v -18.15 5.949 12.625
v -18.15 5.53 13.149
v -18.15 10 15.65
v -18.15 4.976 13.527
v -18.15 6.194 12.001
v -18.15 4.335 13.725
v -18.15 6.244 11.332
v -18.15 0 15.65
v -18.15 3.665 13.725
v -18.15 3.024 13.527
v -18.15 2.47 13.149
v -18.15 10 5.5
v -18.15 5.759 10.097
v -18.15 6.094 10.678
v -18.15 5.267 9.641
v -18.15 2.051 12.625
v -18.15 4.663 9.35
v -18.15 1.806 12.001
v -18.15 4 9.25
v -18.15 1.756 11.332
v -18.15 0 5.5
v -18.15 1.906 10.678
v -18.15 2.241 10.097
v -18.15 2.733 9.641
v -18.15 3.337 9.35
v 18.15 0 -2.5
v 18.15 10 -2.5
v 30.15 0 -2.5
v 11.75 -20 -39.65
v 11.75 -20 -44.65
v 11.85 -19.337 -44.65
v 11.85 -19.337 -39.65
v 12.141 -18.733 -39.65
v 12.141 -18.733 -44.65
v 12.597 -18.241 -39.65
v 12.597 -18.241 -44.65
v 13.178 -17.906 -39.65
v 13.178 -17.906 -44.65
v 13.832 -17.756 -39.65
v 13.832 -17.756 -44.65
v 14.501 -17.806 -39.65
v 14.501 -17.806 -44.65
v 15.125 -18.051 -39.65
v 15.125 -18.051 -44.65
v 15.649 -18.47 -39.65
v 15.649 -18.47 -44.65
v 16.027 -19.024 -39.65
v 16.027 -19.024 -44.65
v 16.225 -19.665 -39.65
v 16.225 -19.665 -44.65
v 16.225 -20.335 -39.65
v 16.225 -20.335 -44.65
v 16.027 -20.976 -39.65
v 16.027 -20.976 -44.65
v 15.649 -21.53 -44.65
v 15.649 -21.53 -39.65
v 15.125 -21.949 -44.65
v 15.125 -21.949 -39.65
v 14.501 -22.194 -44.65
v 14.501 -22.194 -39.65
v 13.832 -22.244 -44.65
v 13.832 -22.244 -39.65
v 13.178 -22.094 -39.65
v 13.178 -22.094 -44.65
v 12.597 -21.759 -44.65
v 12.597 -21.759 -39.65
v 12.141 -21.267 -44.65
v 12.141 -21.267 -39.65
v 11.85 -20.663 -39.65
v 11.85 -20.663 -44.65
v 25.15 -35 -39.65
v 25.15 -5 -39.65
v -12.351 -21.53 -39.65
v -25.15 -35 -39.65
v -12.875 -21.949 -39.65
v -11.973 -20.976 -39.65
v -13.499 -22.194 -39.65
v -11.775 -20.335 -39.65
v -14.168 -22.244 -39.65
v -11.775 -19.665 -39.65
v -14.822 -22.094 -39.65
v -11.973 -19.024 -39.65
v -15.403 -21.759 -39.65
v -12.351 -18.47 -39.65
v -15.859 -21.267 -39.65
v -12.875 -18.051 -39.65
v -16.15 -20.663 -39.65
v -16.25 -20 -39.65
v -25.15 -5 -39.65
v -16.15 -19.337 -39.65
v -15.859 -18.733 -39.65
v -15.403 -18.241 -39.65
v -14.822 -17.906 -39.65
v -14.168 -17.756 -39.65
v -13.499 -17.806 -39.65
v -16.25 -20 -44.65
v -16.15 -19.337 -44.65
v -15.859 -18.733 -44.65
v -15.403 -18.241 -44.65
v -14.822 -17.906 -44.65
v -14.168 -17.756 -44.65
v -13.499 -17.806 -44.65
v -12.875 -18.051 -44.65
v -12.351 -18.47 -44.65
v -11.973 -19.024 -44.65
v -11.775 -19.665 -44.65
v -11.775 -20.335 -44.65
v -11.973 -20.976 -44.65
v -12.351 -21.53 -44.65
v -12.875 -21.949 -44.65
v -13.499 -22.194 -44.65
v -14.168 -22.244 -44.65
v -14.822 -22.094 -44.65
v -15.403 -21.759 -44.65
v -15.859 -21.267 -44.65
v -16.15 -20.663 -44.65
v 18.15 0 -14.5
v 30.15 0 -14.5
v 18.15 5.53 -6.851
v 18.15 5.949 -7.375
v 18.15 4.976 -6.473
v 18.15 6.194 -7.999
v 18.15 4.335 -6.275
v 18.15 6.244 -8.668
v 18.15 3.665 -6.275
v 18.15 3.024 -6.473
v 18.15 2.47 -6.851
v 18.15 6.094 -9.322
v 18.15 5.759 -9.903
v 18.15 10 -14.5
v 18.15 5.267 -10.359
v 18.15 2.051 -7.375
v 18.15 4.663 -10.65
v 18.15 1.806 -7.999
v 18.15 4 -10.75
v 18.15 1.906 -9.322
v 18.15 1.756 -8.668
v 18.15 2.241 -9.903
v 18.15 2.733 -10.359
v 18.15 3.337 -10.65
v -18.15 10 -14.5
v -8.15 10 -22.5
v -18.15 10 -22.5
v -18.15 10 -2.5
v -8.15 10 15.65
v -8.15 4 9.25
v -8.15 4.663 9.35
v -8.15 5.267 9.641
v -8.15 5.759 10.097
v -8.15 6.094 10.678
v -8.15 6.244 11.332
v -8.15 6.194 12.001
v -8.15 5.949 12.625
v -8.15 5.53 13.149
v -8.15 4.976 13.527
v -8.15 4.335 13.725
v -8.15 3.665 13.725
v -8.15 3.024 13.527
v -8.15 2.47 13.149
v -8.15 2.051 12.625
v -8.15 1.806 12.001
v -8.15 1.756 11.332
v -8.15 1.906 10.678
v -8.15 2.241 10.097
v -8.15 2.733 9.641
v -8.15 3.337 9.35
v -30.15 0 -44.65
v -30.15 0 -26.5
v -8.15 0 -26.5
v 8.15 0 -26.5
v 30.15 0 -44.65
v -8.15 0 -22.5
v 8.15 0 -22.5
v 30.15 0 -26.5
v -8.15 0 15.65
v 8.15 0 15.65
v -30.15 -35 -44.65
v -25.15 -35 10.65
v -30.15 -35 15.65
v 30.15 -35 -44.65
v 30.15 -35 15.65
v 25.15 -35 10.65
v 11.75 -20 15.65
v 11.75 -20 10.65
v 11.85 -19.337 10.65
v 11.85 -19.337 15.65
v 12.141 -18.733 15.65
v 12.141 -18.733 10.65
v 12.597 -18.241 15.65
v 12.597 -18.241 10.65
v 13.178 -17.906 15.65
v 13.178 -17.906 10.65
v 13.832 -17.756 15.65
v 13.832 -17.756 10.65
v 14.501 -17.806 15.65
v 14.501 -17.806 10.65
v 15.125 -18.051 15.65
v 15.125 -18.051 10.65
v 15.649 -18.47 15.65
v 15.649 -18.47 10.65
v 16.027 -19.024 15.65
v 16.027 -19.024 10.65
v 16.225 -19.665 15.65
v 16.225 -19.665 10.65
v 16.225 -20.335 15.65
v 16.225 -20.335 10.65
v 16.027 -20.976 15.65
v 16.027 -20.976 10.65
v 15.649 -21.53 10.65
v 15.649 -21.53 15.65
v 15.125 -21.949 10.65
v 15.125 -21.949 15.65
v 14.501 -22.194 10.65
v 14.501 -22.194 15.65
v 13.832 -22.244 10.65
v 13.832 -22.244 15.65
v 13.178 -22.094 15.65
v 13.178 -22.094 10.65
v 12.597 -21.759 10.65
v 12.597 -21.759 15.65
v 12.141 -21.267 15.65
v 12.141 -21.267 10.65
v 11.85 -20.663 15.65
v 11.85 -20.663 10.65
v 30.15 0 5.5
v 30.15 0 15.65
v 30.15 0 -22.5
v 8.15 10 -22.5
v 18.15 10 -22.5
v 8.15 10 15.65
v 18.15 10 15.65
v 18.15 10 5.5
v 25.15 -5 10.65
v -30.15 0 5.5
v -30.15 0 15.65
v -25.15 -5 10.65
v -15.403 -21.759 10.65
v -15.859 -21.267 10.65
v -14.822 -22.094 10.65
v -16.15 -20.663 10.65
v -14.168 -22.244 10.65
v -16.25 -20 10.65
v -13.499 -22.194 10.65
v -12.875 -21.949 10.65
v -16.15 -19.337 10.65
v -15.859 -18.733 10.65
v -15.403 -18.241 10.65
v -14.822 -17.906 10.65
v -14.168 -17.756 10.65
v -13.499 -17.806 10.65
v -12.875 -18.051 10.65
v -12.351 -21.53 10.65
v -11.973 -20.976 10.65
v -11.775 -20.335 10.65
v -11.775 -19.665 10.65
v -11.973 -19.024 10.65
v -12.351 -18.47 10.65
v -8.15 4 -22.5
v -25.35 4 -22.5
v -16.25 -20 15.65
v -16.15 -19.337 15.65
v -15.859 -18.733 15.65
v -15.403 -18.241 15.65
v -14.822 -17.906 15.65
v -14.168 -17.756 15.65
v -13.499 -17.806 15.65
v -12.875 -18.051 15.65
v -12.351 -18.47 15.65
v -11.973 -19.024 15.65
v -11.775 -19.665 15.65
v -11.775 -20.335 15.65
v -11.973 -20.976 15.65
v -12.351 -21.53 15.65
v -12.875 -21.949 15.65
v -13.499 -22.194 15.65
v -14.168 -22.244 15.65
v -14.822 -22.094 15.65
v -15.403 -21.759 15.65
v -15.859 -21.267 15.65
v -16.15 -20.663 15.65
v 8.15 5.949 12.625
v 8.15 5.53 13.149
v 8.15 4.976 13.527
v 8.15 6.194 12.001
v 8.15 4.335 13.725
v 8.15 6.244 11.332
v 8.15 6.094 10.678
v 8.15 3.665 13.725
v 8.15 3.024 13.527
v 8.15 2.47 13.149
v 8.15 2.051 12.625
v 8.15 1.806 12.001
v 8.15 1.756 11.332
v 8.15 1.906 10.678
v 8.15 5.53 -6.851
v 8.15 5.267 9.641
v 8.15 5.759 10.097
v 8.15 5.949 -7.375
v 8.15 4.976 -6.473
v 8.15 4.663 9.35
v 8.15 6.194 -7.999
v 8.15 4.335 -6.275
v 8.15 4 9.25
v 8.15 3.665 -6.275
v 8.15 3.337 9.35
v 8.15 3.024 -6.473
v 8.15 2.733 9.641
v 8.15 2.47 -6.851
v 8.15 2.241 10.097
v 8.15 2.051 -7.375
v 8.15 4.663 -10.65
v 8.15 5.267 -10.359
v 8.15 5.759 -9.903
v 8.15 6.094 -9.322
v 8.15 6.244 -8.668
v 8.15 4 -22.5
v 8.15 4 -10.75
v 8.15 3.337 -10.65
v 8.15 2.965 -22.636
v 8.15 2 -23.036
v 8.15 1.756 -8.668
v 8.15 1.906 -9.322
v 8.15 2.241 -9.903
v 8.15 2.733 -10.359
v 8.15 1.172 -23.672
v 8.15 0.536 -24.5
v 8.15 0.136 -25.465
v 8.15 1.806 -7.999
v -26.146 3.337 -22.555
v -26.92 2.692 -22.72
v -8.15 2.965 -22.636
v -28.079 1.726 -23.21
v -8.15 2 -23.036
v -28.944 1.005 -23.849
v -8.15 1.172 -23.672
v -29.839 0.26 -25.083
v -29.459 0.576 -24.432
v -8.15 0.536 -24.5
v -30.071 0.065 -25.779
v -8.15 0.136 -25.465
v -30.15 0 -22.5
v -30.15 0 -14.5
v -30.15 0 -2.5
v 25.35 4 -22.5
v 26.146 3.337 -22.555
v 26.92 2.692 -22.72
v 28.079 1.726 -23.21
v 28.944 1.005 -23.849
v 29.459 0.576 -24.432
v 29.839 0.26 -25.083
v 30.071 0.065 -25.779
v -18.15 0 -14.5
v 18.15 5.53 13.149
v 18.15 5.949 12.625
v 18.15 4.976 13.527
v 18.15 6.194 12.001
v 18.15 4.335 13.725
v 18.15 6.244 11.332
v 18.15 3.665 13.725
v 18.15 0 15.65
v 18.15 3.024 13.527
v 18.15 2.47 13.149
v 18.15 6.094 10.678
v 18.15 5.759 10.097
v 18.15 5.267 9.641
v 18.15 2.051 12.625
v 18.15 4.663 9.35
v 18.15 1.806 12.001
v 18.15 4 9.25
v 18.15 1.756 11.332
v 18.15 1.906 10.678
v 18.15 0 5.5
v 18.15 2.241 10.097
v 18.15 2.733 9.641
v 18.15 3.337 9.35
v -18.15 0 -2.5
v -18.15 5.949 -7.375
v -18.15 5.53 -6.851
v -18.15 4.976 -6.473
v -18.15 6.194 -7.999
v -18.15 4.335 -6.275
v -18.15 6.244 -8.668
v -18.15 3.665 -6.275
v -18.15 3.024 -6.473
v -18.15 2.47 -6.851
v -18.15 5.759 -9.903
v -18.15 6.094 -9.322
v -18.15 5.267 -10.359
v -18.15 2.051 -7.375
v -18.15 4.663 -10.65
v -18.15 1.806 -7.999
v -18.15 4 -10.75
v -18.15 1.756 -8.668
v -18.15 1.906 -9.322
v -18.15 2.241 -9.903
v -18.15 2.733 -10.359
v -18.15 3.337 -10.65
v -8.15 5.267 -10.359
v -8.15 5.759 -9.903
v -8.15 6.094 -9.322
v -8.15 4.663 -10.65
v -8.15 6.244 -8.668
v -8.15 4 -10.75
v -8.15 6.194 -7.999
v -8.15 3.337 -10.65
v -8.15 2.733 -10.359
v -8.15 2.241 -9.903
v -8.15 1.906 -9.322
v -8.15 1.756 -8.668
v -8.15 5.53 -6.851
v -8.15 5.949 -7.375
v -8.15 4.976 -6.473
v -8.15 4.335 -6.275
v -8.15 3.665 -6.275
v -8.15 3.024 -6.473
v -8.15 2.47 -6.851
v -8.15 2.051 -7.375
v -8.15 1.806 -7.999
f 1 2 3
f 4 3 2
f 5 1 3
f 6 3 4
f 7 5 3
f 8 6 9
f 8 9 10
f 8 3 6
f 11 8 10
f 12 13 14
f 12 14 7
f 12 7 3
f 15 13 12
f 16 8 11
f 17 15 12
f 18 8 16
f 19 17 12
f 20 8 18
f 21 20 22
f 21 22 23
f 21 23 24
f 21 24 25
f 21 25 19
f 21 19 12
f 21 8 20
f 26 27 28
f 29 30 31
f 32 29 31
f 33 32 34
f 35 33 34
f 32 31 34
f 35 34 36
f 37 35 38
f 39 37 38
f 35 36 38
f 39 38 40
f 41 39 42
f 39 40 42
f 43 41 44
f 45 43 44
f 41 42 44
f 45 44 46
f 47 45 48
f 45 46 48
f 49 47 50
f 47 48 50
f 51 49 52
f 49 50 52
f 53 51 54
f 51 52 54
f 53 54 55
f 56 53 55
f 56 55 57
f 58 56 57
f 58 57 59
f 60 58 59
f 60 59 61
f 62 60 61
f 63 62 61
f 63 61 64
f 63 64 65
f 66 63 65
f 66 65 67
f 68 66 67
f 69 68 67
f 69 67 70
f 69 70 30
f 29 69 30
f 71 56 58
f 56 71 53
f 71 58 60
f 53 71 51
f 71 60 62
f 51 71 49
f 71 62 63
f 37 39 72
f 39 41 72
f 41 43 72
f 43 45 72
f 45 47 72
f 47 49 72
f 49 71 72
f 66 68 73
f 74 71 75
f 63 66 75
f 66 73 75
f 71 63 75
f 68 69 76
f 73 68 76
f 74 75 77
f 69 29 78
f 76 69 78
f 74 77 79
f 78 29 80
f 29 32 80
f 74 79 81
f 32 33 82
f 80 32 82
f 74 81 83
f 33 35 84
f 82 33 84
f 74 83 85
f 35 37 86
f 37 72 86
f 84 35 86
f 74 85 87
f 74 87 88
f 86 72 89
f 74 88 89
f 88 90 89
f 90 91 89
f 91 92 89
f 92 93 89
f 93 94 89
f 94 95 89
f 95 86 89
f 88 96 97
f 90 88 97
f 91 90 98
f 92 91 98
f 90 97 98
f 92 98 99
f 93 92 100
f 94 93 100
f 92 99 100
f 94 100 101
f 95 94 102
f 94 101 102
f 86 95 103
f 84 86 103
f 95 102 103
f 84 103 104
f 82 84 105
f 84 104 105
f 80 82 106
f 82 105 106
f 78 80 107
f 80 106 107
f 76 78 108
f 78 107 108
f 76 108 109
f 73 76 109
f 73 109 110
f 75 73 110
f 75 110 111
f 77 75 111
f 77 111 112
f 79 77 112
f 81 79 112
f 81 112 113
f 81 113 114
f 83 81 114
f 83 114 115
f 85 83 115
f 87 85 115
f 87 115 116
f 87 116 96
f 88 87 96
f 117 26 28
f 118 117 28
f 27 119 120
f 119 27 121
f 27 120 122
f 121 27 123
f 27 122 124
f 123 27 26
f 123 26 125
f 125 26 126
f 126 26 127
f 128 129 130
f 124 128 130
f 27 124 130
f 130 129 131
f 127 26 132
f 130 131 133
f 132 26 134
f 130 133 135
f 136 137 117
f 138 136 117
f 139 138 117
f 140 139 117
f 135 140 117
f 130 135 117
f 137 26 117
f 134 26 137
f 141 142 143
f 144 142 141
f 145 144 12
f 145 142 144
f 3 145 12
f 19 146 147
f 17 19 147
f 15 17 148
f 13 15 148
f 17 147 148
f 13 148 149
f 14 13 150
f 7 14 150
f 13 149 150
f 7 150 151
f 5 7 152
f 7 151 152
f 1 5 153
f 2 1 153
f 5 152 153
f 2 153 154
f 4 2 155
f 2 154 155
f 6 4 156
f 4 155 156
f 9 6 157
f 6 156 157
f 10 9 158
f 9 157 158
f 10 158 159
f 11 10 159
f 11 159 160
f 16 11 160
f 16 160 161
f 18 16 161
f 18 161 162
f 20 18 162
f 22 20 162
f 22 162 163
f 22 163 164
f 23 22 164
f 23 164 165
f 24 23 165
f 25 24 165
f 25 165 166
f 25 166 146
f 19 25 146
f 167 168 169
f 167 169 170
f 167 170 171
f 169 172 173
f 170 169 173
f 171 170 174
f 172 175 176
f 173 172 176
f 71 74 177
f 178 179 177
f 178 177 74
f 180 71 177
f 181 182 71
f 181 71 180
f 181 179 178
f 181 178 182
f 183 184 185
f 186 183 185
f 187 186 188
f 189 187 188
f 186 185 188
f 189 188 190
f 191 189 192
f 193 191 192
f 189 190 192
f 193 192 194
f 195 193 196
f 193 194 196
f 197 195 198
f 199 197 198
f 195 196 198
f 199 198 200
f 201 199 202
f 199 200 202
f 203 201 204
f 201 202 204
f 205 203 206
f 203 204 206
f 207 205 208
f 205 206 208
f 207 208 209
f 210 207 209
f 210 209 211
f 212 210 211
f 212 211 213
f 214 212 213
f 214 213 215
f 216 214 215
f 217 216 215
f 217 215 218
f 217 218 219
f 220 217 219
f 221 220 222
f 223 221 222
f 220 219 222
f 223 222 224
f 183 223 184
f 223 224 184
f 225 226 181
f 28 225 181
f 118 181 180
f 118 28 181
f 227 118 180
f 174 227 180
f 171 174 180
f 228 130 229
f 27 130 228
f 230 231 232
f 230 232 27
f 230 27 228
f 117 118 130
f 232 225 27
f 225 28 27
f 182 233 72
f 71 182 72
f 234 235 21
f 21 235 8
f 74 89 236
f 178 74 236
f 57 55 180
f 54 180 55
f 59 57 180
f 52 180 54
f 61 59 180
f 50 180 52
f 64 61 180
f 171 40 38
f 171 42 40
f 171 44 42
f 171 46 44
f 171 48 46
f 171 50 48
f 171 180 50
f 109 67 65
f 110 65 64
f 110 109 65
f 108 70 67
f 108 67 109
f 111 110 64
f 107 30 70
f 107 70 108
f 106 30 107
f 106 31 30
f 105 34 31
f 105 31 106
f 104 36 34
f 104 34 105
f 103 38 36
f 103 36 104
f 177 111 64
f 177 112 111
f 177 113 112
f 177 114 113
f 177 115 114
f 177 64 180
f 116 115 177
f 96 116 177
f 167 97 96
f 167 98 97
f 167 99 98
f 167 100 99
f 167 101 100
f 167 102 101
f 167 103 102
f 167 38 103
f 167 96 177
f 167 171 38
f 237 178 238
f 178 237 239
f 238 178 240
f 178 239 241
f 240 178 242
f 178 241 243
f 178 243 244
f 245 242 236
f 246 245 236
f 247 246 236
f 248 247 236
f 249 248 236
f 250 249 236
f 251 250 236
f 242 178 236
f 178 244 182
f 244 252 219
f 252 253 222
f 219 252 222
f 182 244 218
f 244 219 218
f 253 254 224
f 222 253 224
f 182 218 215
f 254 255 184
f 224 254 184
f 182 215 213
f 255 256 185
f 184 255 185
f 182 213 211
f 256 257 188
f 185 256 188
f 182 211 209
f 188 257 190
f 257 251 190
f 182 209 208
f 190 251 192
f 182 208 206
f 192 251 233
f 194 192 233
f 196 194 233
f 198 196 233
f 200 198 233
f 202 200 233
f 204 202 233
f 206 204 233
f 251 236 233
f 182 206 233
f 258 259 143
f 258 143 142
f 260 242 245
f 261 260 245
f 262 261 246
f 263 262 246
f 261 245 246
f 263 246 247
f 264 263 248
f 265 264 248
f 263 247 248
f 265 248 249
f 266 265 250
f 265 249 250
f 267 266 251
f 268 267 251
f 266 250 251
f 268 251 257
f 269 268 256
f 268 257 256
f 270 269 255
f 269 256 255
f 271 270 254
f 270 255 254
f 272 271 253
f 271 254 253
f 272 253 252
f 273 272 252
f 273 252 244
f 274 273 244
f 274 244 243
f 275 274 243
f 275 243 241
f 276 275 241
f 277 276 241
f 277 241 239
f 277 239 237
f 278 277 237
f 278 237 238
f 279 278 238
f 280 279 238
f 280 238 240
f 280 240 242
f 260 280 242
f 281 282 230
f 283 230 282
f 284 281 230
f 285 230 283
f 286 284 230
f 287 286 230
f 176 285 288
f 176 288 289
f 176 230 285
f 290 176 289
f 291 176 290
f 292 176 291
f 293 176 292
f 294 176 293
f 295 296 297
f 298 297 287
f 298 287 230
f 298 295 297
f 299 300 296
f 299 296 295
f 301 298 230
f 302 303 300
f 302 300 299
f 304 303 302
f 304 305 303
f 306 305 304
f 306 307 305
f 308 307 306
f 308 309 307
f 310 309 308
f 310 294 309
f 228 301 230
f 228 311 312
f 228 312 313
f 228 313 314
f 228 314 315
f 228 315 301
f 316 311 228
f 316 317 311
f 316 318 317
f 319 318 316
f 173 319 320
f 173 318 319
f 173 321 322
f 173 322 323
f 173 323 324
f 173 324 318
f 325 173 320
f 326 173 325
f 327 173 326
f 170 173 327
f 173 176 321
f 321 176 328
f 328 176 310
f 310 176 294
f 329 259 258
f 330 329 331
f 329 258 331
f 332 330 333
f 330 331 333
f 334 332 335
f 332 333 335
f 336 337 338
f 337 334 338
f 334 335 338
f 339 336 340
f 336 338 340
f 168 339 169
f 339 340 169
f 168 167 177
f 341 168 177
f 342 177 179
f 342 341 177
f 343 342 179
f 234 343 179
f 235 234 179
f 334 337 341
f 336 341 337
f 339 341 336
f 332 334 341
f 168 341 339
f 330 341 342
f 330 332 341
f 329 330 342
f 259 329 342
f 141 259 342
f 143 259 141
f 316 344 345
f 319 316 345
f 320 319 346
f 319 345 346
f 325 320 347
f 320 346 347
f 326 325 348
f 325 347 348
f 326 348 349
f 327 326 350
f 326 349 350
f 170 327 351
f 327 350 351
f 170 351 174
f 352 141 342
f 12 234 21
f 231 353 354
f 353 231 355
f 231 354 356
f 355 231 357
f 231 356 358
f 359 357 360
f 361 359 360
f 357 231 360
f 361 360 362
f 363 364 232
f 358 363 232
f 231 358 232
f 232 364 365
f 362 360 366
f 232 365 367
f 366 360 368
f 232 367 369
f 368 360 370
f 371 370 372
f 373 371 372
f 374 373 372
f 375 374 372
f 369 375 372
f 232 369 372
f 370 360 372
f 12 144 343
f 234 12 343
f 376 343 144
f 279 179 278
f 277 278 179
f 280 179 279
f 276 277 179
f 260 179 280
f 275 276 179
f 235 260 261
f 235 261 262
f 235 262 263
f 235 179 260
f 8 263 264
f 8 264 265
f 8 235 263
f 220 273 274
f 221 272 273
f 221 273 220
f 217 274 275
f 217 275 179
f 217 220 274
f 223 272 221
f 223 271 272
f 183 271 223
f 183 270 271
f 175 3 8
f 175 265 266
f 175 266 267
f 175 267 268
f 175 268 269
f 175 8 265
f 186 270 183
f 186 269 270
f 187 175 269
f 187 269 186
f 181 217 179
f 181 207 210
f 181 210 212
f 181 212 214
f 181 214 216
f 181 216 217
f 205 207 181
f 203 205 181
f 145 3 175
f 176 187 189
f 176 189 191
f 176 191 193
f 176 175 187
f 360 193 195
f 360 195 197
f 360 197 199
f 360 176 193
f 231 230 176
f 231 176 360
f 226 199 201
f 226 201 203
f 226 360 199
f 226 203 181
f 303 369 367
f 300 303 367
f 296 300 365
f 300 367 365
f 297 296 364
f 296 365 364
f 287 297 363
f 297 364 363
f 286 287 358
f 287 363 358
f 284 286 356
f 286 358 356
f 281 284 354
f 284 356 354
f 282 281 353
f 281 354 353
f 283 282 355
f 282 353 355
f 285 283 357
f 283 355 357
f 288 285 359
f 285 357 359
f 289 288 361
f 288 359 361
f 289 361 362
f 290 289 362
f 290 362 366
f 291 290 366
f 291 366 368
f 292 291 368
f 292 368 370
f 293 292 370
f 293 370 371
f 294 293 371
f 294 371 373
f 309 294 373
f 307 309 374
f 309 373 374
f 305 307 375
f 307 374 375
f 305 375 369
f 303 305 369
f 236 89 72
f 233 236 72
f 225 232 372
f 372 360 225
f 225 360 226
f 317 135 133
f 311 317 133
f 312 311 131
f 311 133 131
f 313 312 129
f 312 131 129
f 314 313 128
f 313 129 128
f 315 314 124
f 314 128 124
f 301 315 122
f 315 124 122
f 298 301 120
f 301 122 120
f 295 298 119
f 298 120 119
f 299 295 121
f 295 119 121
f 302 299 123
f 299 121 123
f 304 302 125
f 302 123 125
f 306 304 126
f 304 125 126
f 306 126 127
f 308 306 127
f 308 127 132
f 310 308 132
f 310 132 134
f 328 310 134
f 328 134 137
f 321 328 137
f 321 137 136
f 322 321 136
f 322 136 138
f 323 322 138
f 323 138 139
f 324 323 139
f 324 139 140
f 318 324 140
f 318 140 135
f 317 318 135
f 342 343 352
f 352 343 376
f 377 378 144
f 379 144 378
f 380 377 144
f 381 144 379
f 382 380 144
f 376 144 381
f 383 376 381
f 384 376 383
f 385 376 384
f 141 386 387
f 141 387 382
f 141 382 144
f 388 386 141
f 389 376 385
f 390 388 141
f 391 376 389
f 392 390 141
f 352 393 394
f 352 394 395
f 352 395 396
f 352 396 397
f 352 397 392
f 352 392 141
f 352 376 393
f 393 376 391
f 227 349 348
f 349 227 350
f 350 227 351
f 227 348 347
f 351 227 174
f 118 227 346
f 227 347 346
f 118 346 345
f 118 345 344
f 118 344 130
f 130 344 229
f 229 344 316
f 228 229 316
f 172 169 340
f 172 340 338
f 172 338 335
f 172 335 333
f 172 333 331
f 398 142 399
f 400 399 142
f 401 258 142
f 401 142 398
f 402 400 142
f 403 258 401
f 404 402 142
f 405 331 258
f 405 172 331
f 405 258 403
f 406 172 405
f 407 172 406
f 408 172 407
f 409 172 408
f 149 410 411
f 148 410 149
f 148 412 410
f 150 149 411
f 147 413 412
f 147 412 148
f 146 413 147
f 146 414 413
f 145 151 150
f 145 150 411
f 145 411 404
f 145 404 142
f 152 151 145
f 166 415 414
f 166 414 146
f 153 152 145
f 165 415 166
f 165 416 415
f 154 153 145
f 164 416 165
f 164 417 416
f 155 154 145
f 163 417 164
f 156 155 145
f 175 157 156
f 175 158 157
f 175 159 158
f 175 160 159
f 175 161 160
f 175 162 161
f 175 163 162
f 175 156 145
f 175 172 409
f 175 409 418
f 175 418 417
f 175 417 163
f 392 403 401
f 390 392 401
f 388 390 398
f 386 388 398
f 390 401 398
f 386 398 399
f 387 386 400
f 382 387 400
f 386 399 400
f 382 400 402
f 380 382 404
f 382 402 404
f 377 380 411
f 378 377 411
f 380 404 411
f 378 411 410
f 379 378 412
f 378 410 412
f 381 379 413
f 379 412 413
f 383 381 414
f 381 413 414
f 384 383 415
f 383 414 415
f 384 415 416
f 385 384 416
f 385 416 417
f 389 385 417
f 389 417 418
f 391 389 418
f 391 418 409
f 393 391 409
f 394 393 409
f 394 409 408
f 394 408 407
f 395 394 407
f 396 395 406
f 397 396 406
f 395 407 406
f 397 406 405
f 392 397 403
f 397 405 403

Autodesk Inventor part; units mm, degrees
ref_plane "YZ Plane" through (0, 0, 0) normal (1, 0, 0) x (0, 1, 0)
ref_plane "XZ Plane" through (0, 0, 0) normal (0, 1, 0) x (-1, 0, 0)
sketch "Sketch1" plane through (0, 0, 0) normal (0, 1, 0) x (-1, 0, 0)
  line L0 (8.15, 22.5) -> (-8.15, 22.5)
  line L1 (-8.15, 22.5) -> (-8.15, -22.5)
  line L2 (-8.15, -22.5) -> (8.15, -22.5)
  line L3 (8.15, -22.5) -> (8.15, 22.5)
  line L4 (8.15, 22.5) -> (-8.15, -22.5) construction
  line L5 (-8.15, 22.5) -> (8.15, -22.5) construction
  line L6 (8.15, 22.5) -> (18.15, 22.5)
  line L7 (18.15, 22.5) -> (18.15, -22.5)
  line L8 (18.15, -22.5) -> (8.15, -22.5)
  line L9 (8.15, -22.5) -> (8.15, 22.5)
  line L10 (-8.15, 22.5) -> (-18.15, 22.5)
  line L11 (-18.15, 22.5) -> (-18.15, -22.5)
  line L12 (-18.15, -22.5) -> (-8.15, -22.5)
  line L13 (-8.15, -22.5) -> (-8.15, 22.5)
  line L14 (-18.15, 22.5) -> (-18.15, 15.65) construction
  line L15 (-18.15, 15.65) -> (18.15, 15.65)
  point P0 (0, 0)
  point P1 (8.15, -22.5)
  point P2 (8.15, 15.65)
  point P3 (-8.15, 15.65)
  dimension "d0" = 16.3
  dimension "d1" = 45
  dimension "d2" = 10
  dimension "d3" = 10
  dimension "d48" = 6.85
extrude "Extrusion1" add sketch "Sketch1" along normal blind 10 contours L15 L7 L8 L3 | L1 L12 L11 L15
sketch "Sketch2" plane through (18.15, 10, 22.5) normal (1, 0, 0) x (0, 0, -1)
  line L0 (0, -10) -> (0, 0) construction
  line L1 (0, -10) -> (11, -10) construction
  line L2 (6.85, -10) -> (45, -10) construction
  line L3 (11, -10) -> (11, -6) construction
  line L4 (11, -10) -> (31, -10) construction
  line L5 (31, -10) -> (31, -6) construction
  circle A0 centre (11, -6) radius 2.25
  circle A1 centre (31, -6) radius 2.25
  point P0 (22.5, -10)
  dimension "d8" = 11
  dimension "d9" = 4
  dimension "d10" = 20
  dimension "d11" = 4
  dimension "d12" = 4.5
extrude "Extrusion3" cut sketch "Sketch2" against normal blind 60
sketch "Sketch3" plane through (0, 0, 0) normal (0, -1, 0) x (1, 0, 0)
  line L0 (8.15, -22.5) -> (-8.15, -22.5) construction
  line L1 (0, -22.5) -> (0, -14.5) construction
  line L2 (-25.15, 10.65) -> (25.15, 10.65)
  line L3 (25.15, 10.65) -> (25.15, -39.65)
  line L4 (25.15, -39.65) -> (-25.15, -39.65)
  line L5 (-25.15, -39.65) -> (-25.15, 10.65)
  line L6 (-25.15, 10.65) -> (25.15, -39.65) construction
  line L7 (25.15, 10.65) -> (-25.15, -39.65) construction
  line L8 (-30.15, 15.65) -> (30.15, 15.65)
  line L9 (30.15, 15.65) -> (30.15, -44.65)
  line L10 (30.15, -44.65) -> (-30.15, -44.65)
  line L11 (-30.15, -44.65) -> (-30.15, 15.65)
  line L12 (-30.15, 15.65) -> (30.15, -44.65) construction
  line L13 (30.15, 15.65) -> (-30.15, -44.65) construction
  point P0 (0, 0)
  dimension "d16" = 8
  dimension "d17" = 50.3
  dimension "d18" = 50.3
  dimension "d19" = 60.3
  dimension "d20" = 60.3
extrude "Extrusion4" add sketch "Sketch3" along normal blind 5 contours L2 L3 L4 L5 | L8 L9 L10 L11
extrude "Extrusion5" add sketch "Sketch3" along normal blind 35
sketch "Sketch4" plane through (30.15, 0, -44.65) normal (0, 0, -1) x (-1, 0, 0)
  circle A0 centre (44.15, -20) radius 2.25
  line L0 (16.15, -20) -> (44.15, -20) construction
  line L1 (0, -35) -> (48, -35) construction
  line L2 (0, -35) -> (0, -20) construction
  circle A1 centre (16.15, -20) radius 2.25
  line L3 (60.3, 0) -> (60.3, -35) projected
  line L4 (0, 0) -> (0, -35) projected
  line L5 (60.3, -35) -> (0, -35)
  line L6 (0, -35) -> (0, -5)
  line L7 (0, -5) -> (60.3, -5)
  line L8 (60.3, -5) -> (60.3, -35)
  line L9 (60.3, -35) -> (0, -5) construction
  line L10 (30.15, -20) -> (30.15, -16.3233) construction
  line L11 (30.15, -20) -> (30.15, -23.594) construction
  point P0 (0, -35)
  point P1 (0, -35)
  dimension "d25" = 15
  dimension "d27" = 28
  dimension "d28" = 4.5
  dimension "d29" = 4.5
  dimension "d36" = 30
extrude "Extrusion6" cut sketch "Sketch4" against normal blind 61 contours A0 | A1
sketch "Sketch5" plane through (18.15, 10, -22.5) normal (0, 0, -1) x (-1, 0, 0)
  line L0 (26.3, 0) -> (36.3, 0) projected
  line L1 (-12, -10) -> (48.3, -10) projected
  line L2 (36.3, 0) -> (36.3, -15)
  line L3 (36.3, -15) -> (48.3, -15)
  line L4 (48.3, -10) -> (36.3, 0)
  line L5 (0, -10) -> (0, 0) projected
  line L6 (0, 0) -> (0, -15)
  line L7 (-12, -10) -> (0, -10) projected
  line L8 (0, -15) -> (-12, -15)
  line L9 (-12, -10) -> (0, 0)
  point P0 (18.15, -10)
  point P1 (36.3, -10)
extrude "Extrusion7" add sketch "Sketch5" against normal blind 8
ref_plane "Work Plane1" through (18.15, 10, -2.5) normal (0, 0, 1) x (1, 0, 0)
sketch "Sketch6" plane through (18.15, 10, -2.5) normal (0, 0, 1) x (1, 0, 0)
  line L0 (-36.3, -10) -> (-48.3, -10) projected
  line L1 (-36.3, 0) -> (-36.3, -10) projected
  line L2 (-36.3, 0) -> (-48.3, -10) projected
  line L3 (12, -10) -> (0, -10) projected
  line L4 (12, -10) -> (0, 0) projected
  line L5 (0, -10) -> (0, 0) projected
  point P0 (-18.15, -10)
extrude "Extrusion8" add sketch "Sketch6" along normal blind 8
fillet "Fillet4" radius 4 2 edges at (19.15, 0, -22.5) (-19.15, 0, -22.5)
properties part number "Suck-brack" material "PBT Plastic"
